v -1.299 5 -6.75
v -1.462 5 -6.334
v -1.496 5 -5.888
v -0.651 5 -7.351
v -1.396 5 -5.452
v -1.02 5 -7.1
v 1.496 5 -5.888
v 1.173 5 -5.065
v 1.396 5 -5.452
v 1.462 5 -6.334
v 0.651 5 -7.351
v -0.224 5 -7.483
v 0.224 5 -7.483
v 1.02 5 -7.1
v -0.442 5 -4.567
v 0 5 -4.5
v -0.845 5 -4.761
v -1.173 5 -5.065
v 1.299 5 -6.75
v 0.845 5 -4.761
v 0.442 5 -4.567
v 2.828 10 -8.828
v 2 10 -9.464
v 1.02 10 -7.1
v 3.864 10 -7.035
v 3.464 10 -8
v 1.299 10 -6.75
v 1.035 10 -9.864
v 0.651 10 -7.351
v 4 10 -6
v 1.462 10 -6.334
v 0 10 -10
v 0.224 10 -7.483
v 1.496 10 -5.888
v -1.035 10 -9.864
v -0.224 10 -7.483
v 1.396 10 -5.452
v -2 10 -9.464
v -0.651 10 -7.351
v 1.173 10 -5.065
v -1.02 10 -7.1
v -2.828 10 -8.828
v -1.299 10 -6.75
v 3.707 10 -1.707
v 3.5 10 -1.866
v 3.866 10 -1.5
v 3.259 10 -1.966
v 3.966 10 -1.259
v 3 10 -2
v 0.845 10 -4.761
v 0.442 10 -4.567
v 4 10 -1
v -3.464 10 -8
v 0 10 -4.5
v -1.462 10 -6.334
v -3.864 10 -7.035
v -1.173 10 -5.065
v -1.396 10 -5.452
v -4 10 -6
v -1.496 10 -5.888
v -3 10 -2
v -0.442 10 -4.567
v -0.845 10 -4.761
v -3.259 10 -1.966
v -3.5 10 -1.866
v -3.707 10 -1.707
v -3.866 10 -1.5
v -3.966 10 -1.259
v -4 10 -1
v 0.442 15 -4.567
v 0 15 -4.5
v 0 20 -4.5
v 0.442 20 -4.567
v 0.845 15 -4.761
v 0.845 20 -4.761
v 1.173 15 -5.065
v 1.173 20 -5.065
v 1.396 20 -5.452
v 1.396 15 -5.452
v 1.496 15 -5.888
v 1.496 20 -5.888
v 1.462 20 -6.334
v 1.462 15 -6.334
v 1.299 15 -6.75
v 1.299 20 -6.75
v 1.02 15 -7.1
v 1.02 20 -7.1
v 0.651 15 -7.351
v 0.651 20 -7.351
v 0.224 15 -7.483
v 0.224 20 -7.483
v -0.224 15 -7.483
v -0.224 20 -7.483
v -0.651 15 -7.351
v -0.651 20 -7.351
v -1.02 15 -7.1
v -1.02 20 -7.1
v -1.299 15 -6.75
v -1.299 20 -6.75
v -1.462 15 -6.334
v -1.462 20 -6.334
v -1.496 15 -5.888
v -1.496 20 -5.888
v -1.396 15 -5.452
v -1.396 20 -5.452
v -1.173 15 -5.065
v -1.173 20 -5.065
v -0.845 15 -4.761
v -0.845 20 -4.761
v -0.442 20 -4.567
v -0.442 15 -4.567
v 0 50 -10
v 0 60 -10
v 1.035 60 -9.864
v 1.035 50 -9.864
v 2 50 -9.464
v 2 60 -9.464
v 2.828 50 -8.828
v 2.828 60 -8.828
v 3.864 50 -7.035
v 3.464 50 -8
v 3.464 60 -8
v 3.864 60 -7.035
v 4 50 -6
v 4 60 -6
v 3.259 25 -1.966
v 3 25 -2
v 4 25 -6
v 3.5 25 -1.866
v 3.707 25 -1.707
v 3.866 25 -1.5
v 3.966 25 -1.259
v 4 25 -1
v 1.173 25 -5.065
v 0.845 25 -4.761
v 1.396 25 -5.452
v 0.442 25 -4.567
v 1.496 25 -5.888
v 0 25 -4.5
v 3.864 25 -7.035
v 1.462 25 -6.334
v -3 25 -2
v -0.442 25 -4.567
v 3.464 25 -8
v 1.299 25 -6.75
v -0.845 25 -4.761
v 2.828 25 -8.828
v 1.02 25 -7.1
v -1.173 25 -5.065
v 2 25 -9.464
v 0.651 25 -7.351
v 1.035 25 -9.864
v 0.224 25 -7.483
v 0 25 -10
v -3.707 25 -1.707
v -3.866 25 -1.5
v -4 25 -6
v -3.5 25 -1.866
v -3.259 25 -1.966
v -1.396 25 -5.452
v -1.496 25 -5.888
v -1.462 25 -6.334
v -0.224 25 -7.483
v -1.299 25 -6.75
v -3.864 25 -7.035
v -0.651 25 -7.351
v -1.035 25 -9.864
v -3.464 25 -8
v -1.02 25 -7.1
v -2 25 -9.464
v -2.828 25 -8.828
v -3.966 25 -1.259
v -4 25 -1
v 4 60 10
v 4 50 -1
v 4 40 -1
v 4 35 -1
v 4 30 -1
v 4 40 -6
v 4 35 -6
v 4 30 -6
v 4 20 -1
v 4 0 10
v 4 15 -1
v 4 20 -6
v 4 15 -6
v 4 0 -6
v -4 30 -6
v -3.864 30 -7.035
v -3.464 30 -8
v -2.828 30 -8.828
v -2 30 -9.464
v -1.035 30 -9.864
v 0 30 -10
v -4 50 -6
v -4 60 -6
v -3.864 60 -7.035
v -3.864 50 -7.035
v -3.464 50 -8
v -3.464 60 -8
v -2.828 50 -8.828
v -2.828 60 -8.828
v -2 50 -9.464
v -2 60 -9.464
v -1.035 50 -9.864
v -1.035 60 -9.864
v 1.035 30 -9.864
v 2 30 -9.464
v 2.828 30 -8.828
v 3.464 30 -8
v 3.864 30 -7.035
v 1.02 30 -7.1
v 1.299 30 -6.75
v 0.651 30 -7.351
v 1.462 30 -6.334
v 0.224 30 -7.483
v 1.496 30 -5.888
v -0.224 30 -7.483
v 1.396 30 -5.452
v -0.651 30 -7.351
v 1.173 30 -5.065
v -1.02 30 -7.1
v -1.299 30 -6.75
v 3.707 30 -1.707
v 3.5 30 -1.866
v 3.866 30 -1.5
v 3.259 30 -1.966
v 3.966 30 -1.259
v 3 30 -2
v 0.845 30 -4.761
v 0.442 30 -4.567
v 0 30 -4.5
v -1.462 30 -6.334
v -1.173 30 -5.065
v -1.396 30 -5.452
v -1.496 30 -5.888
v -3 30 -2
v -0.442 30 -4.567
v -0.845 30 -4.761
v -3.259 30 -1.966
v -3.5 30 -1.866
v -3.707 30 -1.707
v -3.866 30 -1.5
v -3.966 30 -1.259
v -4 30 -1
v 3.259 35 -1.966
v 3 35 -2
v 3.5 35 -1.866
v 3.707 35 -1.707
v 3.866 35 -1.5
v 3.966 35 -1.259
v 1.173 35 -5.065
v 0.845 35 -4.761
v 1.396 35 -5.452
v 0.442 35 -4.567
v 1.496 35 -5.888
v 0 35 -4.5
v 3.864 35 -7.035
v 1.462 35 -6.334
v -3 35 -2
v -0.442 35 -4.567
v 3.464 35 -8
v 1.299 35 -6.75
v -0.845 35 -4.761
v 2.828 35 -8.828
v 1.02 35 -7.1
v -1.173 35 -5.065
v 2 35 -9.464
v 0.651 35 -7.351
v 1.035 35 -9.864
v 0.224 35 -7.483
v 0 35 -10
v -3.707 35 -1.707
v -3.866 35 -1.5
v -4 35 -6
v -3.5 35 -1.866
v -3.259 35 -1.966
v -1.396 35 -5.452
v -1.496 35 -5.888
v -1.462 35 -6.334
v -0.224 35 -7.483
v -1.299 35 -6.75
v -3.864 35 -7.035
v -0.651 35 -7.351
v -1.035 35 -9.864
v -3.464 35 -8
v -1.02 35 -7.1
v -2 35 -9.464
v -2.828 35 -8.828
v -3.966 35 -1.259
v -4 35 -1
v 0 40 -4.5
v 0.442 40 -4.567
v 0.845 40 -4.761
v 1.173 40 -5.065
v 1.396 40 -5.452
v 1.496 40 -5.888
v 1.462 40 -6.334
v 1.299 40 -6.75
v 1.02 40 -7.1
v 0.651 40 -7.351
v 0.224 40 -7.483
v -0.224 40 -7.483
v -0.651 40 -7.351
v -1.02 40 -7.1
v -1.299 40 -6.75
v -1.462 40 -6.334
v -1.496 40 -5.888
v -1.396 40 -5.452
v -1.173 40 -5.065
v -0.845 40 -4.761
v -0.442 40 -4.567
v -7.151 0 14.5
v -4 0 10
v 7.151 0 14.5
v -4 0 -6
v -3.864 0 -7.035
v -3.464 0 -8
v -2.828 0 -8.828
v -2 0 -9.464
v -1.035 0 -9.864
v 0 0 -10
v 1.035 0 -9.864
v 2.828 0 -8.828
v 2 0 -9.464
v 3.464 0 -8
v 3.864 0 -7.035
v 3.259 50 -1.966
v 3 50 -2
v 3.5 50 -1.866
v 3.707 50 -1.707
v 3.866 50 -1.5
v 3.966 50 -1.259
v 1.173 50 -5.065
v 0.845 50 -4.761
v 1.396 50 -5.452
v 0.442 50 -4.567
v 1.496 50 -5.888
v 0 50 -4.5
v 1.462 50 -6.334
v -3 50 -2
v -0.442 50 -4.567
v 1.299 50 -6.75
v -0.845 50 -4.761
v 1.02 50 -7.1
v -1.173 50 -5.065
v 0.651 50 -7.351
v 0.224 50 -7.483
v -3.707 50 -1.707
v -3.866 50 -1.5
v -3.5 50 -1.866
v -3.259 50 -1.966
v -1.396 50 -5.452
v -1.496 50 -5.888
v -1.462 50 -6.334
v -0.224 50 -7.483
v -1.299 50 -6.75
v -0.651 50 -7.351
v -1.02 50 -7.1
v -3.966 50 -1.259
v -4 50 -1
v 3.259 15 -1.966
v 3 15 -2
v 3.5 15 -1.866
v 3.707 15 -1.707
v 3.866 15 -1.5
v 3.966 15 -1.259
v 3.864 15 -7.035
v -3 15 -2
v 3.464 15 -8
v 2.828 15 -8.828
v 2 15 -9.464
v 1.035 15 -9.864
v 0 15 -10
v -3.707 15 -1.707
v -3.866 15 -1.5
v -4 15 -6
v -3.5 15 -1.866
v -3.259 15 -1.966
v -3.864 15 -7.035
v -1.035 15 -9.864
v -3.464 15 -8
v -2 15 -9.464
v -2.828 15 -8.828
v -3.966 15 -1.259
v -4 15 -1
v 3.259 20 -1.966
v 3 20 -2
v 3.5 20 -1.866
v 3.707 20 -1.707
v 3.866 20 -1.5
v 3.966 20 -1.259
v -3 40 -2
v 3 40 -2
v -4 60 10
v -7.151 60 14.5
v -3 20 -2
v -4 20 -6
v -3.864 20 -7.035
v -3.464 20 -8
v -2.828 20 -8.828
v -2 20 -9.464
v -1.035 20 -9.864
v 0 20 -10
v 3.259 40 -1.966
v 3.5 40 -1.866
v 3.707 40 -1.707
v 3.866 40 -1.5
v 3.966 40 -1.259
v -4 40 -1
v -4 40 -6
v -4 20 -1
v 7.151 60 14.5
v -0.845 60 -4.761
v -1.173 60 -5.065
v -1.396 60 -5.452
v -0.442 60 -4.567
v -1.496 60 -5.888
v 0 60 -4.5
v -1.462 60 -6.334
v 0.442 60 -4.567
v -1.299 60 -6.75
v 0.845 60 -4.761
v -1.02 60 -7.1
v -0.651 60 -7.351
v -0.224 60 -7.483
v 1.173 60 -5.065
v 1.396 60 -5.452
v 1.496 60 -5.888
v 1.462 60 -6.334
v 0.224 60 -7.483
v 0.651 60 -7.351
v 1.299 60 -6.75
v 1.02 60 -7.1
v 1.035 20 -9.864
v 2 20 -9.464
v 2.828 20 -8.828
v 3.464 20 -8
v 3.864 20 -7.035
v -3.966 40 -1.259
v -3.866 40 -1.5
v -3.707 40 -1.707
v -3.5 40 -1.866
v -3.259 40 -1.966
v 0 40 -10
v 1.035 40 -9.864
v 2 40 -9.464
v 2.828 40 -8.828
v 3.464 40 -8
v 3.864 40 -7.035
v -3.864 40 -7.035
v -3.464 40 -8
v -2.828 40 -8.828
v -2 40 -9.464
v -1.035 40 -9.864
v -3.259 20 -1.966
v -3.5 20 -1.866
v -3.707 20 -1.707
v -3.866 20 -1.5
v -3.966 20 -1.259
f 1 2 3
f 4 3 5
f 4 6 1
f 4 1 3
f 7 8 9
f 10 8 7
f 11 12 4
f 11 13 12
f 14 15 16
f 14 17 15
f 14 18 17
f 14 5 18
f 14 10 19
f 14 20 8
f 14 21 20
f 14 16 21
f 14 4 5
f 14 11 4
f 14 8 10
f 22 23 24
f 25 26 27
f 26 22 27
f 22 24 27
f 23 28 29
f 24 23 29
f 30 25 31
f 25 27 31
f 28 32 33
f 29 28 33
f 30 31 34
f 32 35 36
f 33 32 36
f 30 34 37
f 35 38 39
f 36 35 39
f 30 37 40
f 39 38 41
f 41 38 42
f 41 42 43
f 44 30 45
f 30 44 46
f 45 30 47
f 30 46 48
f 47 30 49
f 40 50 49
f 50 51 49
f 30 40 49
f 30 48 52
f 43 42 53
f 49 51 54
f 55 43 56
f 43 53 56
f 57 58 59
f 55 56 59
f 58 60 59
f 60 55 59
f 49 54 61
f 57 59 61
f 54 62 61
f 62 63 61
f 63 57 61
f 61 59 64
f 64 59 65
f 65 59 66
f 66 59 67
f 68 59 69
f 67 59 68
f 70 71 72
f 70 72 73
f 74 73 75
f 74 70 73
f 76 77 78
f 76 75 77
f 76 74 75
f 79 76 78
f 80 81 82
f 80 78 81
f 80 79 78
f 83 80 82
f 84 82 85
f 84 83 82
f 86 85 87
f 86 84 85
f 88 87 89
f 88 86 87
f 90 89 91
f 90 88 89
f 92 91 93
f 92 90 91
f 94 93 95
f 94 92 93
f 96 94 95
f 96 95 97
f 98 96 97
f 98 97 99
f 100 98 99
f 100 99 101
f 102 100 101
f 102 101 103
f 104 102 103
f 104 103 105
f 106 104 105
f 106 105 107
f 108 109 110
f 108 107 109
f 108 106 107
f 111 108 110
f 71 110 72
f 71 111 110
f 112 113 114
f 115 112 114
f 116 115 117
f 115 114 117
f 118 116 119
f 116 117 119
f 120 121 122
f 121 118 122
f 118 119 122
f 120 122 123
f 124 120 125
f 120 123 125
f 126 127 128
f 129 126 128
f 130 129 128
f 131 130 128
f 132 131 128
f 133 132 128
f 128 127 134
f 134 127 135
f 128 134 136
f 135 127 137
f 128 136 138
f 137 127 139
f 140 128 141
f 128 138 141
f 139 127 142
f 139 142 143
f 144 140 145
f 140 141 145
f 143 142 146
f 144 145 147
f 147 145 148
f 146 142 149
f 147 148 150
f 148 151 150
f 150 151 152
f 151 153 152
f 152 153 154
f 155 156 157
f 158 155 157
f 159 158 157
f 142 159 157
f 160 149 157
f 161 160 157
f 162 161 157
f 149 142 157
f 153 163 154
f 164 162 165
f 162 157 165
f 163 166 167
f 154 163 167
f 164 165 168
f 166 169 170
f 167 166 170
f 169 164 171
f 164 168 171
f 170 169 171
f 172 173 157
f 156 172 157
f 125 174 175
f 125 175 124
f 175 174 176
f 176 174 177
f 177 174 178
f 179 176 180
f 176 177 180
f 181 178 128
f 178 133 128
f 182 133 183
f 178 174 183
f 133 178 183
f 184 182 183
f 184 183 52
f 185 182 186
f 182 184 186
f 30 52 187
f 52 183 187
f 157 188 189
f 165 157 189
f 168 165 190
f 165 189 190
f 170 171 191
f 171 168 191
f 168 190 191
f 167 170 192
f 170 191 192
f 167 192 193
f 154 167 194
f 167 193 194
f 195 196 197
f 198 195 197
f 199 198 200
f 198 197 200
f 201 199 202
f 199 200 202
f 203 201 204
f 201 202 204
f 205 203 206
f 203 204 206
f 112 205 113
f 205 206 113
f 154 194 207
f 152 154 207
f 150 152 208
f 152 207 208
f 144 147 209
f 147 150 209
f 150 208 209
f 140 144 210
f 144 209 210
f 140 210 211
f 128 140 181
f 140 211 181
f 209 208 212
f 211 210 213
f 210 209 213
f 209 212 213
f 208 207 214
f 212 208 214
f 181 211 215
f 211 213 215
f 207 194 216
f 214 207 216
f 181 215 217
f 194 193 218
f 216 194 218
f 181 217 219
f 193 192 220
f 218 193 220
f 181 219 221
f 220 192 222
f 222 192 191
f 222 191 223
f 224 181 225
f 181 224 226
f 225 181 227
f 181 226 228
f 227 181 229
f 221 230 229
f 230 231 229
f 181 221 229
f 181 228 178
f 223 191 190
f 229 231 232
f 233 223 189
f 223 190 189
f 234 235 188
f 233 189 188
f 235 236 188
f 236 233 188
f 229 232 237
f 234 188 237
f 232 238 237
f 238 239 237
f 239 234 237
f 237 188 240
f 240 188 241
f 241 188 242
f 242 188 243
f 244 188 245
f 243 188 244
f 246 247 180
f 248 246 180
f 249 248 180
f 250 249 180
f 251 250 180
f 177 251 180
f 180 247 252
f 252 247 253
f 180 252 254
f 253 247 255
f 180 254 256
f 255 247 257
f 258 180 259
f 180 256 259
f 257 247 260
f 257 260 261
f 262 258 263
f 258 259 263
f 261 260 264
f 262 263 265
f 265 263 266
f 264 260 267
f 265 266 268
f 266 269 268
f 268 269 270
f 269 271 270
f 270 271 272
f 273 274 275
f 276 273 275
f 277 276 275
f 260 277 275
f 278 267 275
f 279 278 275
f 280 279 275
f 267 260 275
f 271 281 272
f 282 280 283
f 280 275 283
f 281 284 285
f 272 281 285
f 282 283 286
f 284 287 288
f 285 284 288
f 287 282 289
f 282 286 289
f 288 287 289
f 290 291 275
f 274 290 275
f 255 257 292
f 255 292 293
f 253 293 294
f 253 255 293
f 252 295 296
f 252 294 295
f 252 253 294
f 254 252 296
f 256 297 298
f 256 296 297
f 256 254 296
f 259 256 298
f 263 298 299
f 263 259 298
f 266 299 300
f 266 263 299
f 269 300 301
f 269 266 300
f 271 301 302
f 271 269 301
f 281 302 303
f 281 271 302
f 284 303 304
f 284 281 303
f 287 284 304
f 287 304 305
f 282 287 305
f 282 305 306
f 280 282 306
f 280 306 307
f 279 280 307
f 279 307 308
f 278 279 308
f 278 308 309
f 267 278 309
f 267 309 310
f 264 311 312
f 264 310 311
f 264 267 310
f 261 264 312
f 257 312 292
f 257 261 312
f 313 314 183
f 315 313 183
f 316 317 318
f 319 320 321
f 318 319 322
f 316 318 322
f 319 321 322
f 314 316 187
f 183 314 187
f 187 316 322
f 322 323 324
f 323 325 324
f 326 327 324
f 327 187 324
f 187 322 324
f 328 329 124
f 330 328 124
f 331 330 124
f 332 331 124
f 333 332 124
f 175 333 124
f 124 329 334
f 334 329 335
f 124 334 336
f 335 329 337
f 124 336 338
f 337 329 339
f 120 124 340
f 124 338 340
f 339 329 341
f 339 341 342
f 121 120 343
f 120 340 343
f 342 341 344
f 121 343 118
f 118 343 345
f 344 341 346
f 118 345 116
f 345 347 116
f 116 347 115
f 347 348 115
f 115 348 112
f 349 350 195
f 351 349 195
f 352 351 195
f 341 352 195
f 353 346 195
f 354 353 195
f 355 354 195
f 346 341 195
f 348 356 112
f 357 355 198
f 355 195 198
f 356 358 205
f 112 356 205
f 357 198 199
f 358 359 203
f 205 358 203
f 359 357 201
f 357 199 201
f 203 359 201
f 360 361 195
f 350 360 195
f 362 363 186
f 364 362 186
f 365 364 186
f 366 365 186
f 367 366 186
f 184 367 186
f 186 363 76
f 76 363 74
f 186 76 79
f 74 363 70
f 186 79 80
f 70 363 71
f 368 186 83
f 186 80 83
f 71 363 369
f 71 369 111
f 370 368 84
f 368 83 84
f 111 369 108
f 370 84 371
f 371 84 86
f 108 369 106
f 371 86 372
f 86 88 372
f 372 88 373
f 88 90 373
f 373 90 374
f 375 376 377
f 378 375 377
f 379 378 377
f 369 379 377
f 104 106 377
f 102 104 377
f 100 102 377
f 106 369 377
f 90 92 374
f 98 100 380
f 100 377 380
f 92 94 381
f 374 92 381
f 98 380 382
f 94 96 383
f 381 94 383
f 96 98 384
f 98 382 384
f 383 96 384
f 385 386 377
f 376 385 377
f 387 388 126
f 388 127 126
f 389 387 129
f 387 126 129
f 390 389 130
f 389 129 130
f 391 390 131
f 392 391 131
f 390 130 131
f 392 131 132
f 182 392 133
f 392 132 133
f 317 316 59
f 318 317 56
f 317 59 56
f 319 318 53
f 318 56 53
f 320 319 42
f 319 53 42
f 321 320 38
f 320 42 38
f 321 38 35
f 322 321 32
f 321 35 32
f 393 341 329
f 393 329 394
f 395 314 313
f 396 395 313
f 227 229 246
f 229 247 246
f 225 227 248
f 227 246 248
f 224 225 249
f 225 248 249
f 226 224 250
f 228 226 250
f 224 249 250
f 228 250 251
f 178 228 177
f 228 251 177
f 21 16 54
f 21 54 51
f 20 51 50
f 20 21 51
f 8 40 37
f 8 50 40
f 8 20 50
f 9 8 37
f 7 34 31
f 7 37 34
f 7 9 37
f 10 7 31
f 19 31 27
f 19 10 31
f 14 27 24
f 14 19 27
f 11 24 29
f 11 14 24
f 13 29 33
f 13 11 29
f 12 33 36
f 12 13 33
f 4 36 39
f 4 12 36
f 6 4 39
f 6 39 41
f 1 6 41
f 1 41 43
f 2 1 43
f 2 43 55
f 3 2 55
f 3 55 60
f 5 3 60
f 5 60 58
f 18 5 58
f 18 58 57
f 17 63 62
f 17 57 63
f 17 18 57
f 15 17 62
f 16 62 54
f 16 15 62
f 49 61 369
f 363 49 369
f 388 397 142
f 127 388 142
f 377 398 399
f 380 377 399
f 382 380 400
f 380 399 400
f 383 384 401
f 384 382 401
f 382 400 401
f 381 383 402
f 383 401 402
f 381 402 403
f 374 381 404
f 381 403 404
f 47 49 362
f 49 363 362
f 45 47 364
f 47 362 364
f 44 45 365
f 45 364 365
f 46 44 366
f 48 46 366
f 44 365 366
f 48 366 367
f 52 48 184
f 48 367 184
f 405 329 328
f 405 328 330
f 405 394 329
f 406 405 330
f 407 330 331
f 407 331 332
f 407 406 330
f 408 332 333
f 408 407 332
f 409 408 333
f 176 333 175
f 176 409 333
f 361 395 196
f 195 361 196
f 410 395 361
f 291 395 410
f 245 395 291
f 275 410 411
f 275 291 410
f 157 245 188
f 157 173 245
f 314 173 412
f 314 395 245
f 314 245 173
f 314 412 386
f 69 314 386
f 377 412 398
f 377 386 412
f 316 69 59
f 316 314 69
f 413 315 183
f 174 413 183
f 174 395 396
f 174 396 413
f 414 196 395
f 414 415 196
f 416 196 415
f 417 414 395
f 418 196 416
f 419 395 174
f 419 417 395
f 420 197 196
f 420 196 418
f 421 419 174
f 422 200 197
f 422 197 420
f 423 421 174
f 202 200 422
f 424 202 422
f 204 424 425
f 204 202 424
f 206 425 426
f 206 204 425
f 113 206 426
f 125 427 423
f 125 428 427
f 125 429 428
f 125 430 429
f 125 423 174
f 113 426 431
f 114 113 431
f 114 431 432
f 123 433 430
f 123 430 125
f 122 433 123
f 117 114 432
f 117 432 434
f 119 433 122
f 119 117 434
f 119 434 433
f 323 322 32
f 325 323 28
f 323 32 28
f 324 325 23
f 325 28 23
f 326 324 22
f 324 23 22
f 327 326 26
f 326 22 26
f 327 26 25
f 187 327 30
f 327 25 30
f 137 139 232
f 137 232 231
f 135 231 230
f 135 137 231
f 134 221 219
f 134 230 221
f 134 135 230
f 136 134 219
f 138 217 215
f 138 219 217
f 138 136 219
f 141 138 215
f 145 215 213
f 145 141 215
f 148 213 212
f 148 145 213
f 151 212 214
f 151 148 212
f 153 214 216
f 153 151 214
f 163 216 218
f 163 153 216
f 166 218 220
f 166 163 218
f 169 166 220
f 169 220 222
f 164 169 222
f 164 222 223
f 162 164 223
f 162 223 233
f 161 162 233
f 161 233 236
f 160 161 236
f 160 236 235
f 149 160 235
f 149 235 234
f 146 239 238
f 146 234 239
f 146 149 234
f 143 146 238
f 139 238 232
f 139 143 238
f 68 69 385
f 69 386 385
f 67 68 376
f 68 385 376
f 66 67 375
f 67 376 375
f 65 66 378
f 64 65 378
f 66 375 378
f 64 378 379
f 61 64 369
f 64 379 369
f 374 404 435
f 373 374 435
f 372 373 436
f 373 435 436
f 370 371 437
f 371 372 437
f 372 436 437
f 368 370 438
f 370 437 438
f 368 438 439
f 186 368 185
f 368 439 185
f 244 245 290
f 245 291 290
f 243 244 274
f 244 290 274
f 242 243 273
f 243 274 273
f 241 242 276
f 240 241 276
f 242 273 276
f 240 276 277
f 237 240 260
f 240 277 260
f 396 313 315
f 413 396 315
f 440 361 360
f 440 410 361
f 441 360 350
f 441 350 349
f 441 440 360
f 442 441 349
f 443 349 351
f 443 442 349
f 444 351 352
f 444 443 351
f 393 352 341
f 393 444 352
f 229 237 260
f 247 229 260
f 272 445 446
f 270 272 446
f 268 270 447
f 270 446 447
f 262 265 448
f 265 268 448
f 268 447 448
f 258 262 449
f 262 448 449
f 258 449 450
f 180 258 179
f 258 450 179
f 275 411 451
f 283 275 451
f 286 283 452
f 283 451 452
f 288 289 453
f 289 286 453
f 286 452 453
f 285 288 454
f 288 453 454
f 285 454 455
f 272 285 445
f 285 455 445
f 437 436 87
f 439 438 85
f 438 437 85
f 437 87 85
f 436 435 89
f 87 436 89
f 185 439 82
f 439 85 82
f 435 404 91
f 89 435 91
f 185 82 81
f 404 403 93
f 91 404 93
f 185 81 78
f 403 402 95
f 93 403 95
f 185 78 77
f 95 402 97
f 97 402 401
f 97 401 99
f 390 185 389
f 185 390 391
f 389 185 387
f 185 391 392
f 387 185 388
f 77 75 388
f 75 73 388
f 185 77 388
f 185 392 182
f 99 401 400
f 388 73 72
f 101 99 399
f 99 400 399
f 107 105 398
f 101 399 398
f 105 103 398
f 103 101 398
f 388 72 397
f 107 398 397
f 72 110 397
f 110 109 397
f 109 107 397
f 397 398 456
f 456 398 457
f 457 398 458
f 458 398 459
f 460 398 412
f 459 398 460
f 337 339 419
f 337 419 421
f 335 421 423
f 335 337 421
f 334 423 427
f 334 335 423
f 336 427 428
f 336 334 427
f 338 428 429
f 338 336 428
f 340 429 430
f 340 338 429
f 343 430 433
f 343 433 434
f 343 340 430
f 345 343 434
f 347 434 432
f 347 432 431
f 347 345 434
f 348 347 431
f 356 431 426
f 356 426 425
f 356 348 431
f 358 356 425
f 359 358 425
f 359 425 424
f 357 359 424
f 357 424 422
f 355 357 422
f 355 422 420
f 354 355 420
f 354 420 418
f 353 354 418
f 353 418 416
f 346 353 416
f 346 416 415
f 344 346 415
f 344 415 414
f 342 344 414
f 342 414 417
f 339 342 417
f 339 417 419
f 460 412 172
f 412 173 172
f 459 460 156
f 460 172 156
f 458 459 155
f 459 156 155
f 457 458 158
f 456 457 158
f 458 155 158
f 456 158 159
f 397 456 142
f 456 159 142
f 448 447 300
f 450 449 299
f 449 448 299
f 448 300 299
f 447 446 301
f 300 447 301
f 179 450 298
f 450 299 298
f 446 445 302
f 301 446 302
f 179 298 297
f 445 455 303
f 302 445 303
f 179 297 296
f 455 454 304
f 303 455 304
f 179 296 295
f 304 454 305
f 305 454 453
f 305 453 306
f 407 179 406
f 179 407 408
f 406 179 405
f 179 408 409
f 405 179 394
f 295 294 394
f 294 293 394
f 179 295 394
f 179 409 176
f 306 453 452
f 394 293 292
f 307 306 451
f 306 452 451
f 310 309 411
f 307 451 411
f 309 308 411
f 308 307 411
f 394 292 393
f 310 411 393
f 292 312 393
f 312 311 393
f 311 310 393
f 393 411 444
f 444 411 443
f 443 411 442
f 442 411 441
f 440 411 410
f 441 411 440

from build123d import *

# Parameters (mm, degrees)
BOSS_EXTRUDE1_DEPTH     = 60
SKETCH2_W               = 8
SKETCH2_H               = 10
BOSS_EXTRUDE3_DEPTH     = 60
SKETCH3_R               = 1.5
CUT_EXTRUDE1_DEPTH      = 60
FILLET1_R               = 4
CUT_EXTRUDE2_DEPTH      = 60
CUT_EXTRUDE2_DEPTH_BACK = 60
FILLET3_R               = 1
SKETCH5_R               = 2.607227144
BOSS_EXTRUDE4_DEPTH     = 5


with BuildPart() as part:
    # Sketch1 → Boss-Extrude1 (new body)
    with BuildSketch(Plane(origin=(0, 0, 0), x_dir=(1, 0, 0), z_dir=(0, 1, 0))):
        Polygon((4, 0), (-4, 0), (-4, -10), (-7.150933922, -14.5), (-4, -14.5), (4, -14.5), (7.150933922, -14.5), (4, -10), align=None)
    extrude(amount=BOSS_EXTRUDE1_DEPTH)

    # Sketch2 → Boss-Extrude3 (add)
    with BuildSketch(Plane(origin=(0, 0, 0), x_dir=(1, 0, 0), z_dir=(0, 1, 0))):
        with Locations((0, 5)):
            Rectangle(SKETCH2_W, SKETCH2_H)
    extrude(amount=BOSS_EXTRUDE3_DEPTH)

    # Sketch3 → Cut-Extrude1 (cut)
    with BuildSketch(Plane(origin=(0, 0, 0), x_dir=(1, 0, 0), z_dir=(0, 1, 0))):
        with Locations(Location((0, 6, 0), (0, 0, 270))):
            Circle(SKETCH3_R)
    extrude(amount=CUT_EXTRUDE1_DEPTH, mode=Mode.SUBTRACT)

    # Fillet1
    fillet1_edges = [part.edges().sort_by_distance(p)[0] for p in [
        (-4, 30, -10),
        (4, 30, -10),
    ]]
    fillet(fillet1_edges, radius=FILLET1_R - 0.0001)  # a hair under: the kernel refuses the full size

    # Sketch4 → Cut-Extrude2 (cut, two sides: drawn at the far end of the back side and taken through both)
    with BuildSketch(Plane(origin=(0, 0, 0), x_dir=(0, 0, -1), z_dir=(1, 0, 0)).offset(-CUT_EXTRUDE2_DEPTH_BACK)):
        Polygon((12.627548849, 60), (16.888144273, 60), (16.888144273, 0), (13.444072136, 0), (13.444072136, 10), (2, 10), (2, 15), (13.444072136, 15), (13.444072136, 20), (2, 20), (2, 25), (13.444072136, 25), (13.444072136, 30), (2, 30), (2, 35), (13.444072136, 35), (13.444072136, 40), (2, 40), (2, 45), (2, 50), (12.627548849, 50), align=None)
    extrude(amount=CUT_EXTRUDE2_DEPTH + CUT_EXTRUDE2_DEPTH_BACK, mode=Mode.SUBTRACT)

    # Fillet3
    fillet3_edges = [part.edges().sort_by_distance(p)[0] for p in [
        (-4, 12.5, -2),
        (4, 12.5, -2),
        (4, 22.5, -2),
        (4, 32.5, -2),
        (4, 45, -2),
        (-4, 45, -2),
        (-4, 32.5, -2),
        (-4, 22.5, -2),
    ]]
    fillet(fillet3_edges, radius=FILLET3_R)

    # Sketch5 → Boss-Extrude4 (add)
    with BuildSketch(Plane(origin=(0, 0, 0), x_dir=(1, 0, 0), z_dir=(0, 1, 0))):
        with Locations((0, 6)):
            Circle(SKETCH5_R)
    extrude(amount=BOSS_EXTRUDE4_DEPTH)


solid = part.part
